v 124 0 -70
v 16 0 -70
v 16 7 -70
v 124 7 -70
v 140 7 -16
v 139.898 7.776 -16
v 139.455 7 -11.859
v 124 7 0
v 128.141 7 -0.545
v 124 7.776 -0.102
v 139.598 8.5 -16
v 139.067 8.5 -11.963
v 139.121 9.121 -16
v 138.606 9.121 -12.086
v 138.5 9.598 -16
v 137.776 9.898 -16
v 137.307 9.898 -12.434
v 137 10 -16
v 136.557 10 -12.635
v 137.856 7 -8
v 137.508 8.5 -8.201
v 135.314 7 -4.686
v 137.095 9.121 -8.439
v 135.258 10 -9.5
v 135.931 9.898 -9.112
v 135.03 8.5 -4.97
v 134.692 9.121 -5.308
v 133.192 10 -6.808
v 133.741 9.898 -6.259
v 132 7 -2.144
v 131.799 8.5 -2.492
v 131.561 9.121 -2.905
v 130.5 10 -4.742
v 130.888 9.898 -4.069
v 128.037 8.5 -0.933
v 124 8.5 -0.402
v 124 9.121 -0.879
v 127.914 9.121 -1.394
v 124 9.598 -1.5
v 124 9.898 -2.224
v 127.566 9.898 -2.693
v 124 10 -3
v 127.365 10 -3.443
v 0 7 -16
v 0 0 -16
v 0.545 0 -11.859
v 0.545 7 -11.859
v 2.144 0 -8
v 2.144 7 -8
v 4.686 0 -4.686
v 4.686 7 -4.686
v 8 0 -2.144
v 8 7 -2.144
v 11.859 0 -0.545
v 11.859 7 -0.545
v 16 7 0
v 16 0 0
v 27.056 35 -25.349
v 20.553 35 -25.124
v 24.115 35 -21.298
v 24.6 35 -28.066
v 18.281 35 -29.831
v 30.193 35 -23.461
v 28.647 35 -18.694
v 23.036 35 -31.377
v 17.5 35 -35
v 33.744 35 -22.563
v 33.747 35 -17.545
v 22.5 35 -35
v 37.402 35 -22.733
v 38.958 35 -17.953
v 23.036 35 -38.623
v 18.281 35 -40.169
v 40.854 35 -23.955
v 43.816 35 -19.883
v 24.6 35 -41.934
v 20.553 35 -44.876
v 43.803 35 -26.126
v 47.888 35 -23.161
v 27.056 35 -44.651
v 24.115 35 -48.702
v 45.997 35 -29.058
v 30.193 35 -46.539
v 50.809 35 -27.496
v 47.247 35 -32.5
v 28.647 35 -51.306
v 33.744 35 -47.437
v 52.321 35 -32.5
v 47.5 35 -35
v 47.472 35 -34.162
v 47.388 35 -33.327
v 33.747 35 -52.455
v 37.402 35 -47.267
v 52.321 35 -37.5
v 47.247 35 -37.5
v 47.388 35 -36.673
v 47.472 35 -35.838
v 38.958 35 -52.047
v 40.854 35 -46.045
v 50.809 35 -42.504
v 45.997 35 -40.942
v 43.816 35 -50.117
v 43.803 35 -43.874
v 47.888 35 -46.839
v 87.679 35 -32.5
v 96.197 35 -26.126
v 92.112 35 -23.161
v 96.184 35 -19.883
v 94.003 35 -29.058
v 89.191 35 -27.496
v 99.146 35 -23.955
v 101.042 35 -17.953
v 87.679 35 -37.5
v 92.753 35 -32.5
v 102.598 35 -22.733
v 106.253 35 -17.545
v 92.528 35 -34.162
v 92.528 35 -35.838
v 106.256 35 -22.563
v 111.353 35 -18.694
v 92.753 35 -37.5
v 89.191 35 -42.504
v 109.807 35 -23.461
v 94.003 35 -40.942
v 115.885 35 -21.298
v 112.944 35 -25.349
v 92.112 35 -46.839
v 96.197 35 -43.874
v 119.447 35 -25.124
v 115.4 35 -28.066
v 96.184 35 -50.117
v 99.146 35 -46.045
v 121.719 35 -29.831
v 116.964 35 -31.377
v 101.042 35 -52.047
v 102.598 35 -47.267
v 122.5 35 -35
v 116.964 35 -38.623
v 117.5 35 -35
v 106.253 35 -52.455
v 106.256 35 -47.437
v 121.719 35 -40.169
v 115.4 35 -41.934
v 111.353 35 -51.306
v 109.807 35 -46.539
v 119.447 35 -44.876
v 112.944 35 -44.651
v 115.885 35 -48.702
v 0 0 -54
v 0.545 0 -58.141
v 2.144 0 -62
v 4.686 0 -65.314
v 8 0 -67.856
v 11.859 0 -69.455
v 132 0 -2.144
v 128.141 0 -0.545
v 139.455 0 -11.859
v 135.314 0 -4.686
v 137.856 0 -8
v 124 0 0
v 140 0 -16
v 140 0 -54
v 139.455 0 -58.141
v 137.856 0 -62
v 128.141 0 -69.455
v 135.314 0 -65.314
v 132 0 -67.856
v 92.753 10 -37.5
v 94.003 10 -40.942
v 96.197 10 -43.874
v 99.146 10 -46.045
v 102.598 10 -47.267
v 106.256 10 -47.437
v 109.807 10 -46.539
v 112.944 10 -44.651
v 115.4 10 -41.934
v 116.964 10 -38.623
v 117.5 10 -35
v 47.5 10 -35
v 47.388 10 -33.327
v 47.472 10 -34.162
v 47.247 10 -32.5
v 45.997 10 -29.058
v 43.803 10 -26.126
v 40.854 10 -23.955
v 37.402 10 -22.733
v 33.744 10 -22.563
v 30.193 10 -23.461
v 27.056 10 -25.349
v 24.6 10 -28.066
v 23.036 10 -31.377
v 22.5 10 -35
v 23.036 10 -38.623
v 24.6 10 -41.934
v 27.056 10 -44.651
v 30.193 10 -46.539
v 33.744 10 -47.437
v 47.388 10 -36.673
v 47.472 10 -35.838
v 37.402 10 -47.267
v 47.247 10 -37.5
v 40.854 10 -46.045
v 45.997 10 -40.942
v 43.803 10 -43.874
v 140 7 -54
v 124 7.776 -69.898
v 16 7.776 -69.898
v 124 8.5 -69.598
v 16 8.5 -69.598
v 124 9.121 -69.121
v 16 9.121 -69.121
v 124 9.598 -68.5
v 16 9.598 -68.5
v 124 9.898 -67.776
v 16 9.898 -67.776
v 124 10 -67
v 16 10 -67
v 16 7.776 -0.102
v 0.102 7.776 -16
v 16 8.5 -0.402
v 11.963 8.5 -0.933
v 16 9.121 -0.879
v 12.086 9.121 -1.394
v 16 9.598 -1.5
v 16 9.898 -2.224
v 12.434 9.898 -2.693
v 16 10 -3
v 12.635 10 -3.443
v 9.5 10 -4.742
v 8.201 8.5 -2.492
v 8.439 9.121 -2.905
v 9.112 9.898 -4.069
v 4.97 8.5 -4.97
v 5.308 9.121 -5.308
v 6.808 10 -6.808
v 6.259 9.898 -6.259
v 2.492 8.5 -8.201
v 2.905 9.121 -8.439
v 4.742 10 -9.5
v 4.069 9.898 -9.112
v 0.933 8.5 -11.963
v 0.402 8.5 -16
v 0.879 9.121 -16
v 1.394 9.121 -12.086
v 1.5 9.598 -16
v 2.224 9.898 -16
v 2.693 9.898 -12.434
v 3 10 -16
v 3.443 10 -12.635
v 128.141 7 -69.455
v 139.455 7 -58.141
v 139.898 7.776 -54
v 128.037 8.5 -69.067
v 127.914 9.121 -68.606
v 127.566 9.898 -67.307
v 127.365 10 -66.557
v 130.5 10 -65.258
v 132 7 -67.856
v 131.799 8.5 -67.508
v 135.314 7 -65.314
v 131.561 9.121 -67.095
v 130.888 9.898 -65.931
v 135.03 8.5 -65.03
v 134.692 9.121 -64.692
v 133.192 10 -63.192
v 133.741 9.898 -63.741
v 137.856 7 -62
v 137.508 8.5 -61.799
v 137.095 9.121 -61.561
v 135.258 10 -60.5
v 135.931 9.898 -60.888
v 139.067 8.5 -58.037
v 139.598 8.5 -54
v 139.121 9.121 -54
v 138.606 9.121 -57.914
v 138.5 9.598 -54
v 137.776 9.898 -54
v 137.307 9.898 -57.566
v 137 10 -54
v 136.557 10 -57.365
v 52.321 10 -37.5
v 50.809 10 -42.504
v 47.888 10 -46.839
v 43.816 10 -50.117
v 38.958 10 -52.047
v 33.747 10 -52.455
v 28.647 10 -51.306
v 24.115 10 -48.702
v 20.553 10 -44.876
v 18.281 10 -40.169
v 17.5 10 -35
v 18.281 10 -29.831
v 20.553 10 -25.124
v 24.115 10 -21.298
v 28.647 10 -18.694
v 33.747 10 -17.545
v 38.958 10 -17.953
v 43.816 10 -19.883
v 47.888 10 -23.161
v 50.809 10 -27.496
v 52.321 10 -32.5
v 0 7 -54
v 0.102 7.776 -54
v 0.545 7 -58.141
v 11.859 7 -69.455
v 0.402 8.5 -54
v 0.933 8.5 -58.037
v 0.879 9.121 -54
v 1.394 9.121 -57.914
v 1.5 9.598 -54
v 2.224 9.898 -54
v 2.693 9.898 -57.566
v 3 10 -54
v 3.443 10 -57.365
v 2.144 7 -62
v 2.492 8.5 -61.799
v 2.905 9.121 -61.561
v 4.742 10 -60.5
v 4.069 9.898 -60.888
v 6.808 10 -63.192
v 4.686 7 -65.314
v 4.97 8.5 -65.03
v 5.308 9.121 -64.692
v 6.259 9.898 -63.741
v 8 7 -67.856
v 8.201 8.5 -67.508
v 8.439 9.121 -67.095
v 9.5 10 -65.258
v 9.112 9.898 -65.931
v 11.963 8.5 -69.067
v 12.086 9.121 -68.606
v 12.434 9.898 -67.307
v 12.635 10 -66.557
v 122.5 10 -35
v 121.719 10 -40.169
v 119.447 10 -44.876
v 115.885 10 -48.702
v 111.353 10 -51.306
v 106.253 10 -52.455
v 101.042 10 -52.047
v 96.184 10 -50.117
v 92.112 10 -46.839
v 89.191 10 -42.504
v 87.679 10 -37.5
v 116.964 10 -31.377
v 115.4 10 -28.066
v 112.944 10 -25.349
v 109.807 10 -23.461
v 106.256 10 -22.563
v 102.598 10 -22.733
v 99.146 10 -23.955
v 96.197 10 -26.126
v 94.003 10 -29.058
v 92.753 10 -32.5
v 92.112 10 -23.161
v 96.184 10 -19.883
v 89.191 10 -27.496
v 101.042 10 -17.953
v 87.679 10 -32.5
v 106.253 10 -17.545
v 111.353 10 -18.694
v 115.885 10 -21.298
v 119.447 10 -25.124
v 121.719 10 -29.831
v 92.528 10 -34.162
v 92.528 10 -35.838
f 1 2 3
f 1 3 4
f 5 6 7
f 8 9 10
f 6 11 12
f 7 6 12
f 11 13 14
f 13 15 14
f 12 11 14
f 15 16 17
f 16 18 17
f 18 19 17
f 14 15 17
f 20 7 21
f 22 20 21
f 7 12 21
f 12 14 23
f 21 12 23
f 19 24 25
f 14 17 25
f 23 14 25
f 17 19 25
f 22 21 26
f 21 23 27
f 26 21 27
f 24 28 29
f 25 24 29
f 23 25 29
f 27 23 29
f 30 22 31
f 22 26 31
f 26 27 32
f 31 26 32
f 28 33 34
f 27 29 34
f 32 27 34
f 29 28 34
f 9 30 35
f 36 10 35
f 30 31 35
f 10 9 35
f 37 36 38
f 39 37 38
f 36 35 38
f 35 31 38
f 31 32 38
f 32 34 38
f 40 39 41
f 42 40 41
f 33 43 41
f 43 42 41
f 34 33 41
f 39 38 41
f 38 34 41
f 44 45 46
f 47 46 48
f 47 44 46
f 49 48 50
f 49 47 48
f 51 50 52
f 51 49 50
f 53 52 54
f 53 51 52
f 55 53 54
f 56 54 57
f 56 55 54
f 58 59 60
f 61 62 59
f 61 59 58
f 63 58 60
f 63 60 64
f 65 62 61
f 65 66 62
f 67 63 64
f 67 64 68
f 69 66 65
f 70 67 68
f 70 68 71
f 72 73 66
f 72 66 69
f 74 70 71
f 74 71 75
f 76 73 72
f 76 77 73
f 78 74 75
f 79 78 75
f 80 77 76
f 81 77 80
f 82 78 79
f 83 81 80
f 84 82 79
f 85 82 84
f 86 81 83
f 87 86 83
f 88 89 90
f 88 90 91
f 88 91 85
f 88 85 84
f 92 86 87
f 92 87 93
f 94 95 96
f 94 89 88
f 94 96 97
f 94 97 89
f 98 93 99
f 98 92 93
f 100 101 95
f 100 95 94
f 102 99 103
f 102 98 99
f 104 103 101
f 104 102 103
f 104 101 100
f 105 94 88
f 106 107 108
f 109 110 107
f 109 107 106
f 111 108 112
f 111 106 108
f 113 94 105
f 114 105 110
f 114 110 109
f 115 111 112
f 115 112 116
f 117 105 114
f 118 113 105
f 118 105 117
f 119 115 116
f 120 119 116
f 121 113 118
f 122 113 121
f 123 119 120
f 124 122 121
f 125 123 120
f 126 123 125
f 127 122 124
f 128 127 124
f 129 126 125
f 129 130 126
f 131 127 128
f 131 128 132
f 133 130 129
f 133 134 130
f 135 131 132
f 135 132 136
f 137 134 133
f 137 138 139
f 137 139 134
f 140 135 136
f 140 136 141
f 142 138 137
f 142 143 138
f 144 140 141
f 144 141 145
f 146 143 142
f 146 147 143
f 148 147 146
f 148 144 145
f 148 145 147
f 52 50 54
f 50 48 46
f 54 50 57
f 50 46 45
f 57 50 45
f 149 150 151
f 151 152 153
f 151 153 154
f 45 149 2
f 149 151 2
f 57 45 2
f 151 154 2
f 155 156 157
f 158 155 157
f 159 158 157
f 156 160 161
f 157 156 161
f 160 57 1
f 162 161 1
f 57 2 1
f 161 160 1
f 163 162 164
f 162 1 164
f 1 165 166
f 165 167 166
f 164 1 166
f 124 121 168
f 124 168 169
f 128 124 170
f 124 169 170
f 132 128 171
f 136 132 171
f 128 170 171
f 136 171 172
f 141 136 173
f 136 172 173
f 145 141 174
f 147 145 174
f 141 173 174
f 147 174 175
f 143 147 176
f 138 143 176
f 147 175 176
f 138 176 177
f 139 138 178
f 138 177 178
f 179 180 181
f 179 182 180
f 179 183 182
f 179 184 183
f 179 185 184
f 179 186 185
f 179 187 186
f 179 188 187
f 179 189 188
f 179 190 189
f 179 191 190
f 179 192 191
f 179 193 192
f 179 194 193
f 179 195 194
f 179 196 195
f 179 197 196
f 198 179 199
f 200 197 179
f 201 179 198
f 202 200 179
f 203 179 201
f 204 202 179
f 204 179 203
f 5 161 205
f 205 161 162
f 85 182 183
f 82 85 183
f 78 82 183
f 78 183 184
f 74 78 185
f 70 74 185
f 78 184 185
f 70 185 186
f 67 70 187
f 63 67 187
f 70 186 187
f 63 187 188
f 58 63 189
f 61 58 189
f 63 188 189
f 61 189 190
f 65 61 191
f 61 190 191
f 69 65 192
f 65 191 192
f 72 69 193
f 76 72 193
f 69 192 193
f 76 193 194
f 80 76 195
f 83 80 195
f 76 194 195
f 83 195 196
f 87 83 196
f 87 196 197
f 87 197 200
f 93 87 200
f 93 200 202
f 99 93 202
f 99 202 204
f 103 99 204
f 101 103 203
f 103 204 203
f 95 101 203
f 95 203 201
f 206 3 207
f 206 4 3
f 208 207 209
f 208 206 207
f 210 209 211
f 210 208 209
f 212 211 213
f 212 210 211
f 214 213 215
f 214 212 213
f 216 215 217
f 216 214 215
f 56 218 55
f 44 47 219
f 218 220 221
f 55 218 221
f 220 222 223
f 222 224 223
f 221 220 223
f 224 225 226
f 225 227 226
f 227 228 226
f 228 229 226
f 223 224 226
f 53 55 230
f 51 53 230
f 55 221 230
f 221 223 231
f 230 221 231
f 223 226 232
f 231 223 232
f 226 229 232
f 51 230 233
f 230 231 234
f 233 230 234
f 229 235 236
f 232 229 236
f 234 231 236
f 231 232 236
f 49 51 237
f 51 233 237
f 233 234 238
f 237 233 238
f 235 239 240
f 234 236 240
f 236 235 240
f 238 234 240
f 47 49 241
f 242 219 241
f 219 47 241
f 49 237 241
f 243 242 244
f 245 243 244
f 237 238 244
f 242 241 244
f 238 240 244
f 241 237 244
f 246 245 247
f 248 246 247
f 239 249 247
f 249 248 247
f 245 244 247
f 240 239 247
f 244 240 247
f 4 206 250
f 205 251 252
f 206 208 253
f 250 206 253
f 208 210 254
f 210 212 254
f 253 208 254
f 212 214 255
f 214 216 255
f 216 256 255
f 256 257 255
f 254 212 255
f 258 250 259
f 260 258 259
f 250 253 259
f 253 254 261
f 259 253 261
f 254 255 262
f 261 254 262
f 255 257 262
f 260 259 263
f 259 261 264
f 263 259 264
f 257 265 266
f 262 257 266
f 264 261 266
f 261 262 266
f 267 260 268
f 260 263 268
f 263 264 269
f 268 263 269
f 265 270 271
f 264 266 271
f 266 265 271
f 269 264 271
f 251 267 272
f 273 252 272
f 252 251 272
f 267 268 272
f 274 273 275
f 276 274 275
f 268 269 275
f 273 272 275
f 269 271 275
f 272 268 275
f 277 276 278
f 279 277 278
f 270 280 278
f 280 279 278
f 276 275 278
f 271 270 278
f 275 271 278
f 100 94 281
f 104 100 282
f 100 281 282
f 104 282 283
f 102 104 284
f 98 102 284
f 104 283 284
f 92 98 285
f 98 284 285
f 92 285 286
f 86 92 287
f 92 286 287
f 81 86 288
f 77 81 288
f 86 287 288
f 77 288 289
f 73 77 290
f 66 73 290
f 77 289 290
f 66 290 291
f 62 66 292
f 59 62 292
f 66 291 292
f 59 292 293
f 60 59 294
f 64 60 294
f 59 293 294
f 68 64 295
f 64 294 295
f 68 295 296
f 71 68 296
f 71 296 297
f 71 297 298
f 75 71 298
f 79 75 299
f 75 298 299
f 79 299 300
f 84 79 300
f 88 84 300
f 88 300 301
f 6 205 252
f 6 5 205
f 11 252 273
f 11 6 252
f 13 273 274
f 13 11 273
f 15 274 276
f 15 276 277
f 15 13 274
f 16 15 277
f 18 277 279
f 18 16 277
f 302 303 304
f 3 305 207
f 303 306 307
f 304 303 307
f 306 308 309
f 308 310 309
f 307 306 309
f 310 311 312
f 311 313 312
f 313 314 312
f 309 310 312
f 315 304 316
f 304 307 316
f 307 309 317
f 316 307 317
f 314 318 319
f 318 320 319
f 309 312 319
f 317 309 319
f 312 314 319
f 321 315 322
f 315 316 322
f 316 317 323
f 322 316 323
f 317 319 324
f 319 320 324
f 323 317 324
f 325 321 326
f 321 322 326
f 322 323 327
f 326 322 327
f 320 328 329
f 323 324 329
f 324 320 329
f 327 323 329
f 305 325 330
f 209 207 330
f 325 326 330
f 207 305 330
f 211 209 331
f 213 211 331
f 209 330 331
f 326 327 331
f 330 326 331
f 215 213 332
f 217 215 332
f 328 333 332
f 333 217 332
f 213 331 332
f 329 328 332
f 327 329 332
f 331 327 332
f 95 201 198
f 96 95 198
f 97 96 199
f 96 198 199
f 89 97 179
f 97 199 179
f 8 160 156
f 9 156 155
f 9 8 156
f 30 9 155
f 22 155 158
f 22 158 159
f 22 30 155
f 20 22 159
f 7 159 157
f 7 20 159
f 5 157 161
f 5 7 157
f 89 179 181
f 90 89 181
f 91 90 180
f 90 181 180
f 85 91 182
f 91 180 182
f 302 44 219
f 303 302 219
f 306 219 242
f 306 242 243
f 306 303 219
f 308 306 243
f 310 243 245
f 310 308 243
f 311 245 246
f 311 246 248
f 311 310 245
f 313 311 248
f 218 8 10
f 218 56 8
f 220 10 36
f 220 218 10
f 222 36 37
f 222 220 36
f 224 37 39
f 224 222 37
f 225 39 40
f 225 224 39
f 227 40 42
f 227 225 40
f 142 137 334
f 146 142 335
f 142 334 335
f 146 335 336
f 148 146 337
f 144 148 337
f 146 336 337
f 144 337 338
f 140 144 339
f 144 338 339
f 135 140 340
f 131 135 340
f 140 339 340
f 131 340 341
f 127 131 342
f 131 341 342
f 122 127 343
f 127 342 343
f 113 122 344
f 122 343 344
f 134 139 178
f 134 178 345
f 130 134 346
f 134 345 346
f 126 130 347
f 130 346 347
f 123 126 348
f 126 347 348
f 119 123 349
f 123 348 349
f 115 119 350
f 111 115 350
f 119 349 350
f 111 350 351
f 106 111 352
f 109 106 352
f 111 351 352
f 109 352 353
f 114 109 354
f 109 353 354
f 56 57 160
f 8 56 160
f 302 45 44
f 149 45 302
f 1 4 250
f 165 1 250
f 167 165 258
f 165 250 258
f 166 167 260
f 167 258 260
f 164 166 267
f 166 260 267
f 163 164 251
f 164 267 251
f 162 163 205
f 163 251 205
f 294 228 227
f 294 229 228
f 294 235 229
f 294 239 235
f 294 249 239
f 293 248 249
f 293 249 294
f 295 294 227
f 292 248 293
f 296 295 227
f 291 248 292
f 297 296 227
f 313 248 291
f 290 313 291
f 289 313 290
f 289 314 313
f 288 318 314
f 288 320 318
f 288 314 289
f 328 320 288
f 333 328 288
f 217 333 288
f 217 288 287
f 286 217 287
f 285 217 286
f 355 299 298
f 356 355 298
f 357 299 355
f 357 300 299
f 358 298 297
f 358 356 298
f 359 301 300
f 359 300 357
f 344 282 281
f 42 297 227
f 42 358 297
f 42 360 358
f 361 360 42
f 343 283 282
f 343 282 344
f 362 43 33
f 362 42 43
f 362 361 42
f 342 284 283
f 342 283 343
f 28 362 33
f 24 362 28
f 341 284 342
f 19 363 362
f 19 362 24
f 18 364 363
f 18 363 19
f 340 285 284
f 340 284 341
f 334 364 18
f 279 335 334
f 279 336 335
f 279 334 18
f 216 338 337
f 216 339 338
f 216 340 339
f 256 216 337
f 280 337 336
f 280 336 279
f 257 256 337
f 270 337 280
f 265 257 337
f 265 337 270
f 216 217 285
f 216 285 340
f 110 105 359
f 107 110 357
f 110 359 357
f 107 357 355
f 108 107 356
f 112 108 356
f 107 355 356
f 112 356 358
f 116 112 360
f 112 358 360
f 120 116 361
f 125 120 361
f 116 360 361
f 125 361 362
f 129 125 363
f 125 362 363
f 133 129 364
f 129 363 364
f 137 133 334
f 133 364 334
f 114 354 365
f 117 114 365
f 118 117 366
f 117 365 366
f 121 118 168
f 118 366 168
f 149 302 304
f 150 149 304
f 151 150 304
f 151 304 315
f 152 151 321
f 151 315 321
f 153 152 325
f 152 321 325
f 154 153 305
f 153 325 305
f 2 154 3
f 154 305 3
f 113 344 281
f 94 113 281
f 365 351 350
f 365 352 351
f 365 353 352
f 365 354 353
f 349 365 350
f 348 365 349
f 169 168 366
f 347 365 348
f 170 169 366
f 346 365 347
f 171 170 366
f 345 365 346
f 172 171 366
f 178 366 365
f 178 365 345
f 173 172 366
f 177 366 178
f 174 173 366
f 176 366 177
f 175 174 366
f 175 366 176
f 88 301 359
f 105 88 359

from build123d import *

# Parameters (mm, degrees)
SKETCH1_W           = 140
SKETCH1_H           = 70
BOSS_EXTRUDE1_DEPTH = 10
BOSS_EXTRUDE2_DEPTH = 25
FILLET2_R           = 16
FILLET1_R           = 3


with BuildPart() as part:
    # Sketch1 → Boss-Extrude1 (new body)
    with BuildSketch(Plane(origin=(0, 0, 0), x_dir=(1, 0, 0), z_dir=(0, 1, 0))):
        with Locations((70, 35)):
            Rectangle(SKETCH1_W, SKETCH1_H)
    extrude(amount=BOSS_EXTRUDE1_DEPTH)

    # Sketch2 → Boss-Extrude2 (add)
    with BuildSketch(Plane(origin=(0, 10, 0), x_dir=(1, 0, 0), z_dir=(0, 1, 0))):
        with BuildLine():
            ThreePointArc((52.5, 35), (52.45506934, 36.253217594), (52.320508076, 37.5))
            Line((52.320508076, 37.5), (47.247448714, 37.5))
            ThreePointArc((47.247448714, 37.5), (47.436701913, 36.256362025), (47.5, 35))
            ThreePointArc((47.5, 35), (47.436701913, 33.743637975), (47.247448714, 32.5))
            Line((47.247448714, 32.5), (52.320508076, 32.5))
            ThreePointArc((52.320508076, 32.5), (52.45506934, 33.746782406), (52.5, 35))
        make_face()
        with BuildLine():
            Line((47.247448714, 37.5), (52.320508076, 37.5))
            ThreePointArc((52.320508076, 37.5), (17.5, 35), (52.320508076, 32.5))
            Line((52.320508076, 32.5), (47.247448714, 32.5))
            ThreePointArc((47.247448714, 32.5), (22.5, 35), (47.247448714, 37.5))
        make_face()
        with BuildLine():
            Line((70, 32.5), (70, 37.5))
            Line((70, 37.5), (52.320508076, 37.5))
            ThreePointArc((52.320508076, 37.5), (52.45506934, 36.253217594), (52.5, 35))
            ThreePointArc((52.5, 35), (52.45506934, 33.746782406), (52.320508076, 32.5))
            Line((52.320508076, 32.5), (70, 32.5))
        make_face()
        with BuildLine():
            Line((87.679491924, 37.5), (70, 37.5))
            Line((70, 37.5), (70, 32.5))
            Line((70, 32.5), (87.679491924, 32.5))
            ThreePointArc((87.679491924, 32.5), (87.5, 35), (87.679491924, 37.5))
        make_face()
        with BuildLine():
            ThreePointArc((122.5, 35), (106.253217594, 52.45506934), (87.679491924, 37.5))
            Line((87.679491924, 37.5), (92.752551286, 37.5))
            ThreePointArc((92.752551286, 37.5), (106.256362025, 47.436701913), (117.5, 35))
            ThreePointArc((117.5, 35), (106.256362025, 22.563298087), (92.752551286, 32.5))
            Line((92.752551286, 32.5), (87.679491924, 32.5))
            ThreePointArc((87.679491924, 32.5), (106.253217594, 17.54493066), (122.5, 35))
        make_face()
        with BuildLine():
            Line((92.752551286, 37.5), (87.679491924, 37.5))
            ThreePointArc((87.679491924, 37.5), (87.5, 35), (87.679491924, 32.5))
            Line((87.679491924, 32.5), (92.752551286, 32.5))
            ThreePointArc((92.752551286, 32.5), (92.5, 35), (92.752551286, 37.5))
        make_face()
    extrude(amount=BOSS_EXTRUDE2_DEPTH)

    # Fillet2
    fillet2_edges = [part.edges().sort_by_distance(p)[0] for p in [
        (0, 5, -70),
        (140, 5, -70),
        (140, 5, 0),
        (0, 5, 0),
    ]]
    fillet(fillet2_edges, radius=FILLET2_R)

    # Fillet1
    fillet1_edges = [part.edges().sort_by_distance(p)[0] for p in [
        (0, 10, -35),
        (70, 10, -70),
        (70, 10, 0),
        (140, 10, -35),
        (4.686291501, 10, -4.686291501),
        (135.313708499, 10, -4.686291501),
        (135.313708499, 10, -65.313708499),
        (4.686291501, 10, -65.313708499),
    ]]
    fillet(fillet1_edges, radius=FILLET1_R)


solid = part.part
